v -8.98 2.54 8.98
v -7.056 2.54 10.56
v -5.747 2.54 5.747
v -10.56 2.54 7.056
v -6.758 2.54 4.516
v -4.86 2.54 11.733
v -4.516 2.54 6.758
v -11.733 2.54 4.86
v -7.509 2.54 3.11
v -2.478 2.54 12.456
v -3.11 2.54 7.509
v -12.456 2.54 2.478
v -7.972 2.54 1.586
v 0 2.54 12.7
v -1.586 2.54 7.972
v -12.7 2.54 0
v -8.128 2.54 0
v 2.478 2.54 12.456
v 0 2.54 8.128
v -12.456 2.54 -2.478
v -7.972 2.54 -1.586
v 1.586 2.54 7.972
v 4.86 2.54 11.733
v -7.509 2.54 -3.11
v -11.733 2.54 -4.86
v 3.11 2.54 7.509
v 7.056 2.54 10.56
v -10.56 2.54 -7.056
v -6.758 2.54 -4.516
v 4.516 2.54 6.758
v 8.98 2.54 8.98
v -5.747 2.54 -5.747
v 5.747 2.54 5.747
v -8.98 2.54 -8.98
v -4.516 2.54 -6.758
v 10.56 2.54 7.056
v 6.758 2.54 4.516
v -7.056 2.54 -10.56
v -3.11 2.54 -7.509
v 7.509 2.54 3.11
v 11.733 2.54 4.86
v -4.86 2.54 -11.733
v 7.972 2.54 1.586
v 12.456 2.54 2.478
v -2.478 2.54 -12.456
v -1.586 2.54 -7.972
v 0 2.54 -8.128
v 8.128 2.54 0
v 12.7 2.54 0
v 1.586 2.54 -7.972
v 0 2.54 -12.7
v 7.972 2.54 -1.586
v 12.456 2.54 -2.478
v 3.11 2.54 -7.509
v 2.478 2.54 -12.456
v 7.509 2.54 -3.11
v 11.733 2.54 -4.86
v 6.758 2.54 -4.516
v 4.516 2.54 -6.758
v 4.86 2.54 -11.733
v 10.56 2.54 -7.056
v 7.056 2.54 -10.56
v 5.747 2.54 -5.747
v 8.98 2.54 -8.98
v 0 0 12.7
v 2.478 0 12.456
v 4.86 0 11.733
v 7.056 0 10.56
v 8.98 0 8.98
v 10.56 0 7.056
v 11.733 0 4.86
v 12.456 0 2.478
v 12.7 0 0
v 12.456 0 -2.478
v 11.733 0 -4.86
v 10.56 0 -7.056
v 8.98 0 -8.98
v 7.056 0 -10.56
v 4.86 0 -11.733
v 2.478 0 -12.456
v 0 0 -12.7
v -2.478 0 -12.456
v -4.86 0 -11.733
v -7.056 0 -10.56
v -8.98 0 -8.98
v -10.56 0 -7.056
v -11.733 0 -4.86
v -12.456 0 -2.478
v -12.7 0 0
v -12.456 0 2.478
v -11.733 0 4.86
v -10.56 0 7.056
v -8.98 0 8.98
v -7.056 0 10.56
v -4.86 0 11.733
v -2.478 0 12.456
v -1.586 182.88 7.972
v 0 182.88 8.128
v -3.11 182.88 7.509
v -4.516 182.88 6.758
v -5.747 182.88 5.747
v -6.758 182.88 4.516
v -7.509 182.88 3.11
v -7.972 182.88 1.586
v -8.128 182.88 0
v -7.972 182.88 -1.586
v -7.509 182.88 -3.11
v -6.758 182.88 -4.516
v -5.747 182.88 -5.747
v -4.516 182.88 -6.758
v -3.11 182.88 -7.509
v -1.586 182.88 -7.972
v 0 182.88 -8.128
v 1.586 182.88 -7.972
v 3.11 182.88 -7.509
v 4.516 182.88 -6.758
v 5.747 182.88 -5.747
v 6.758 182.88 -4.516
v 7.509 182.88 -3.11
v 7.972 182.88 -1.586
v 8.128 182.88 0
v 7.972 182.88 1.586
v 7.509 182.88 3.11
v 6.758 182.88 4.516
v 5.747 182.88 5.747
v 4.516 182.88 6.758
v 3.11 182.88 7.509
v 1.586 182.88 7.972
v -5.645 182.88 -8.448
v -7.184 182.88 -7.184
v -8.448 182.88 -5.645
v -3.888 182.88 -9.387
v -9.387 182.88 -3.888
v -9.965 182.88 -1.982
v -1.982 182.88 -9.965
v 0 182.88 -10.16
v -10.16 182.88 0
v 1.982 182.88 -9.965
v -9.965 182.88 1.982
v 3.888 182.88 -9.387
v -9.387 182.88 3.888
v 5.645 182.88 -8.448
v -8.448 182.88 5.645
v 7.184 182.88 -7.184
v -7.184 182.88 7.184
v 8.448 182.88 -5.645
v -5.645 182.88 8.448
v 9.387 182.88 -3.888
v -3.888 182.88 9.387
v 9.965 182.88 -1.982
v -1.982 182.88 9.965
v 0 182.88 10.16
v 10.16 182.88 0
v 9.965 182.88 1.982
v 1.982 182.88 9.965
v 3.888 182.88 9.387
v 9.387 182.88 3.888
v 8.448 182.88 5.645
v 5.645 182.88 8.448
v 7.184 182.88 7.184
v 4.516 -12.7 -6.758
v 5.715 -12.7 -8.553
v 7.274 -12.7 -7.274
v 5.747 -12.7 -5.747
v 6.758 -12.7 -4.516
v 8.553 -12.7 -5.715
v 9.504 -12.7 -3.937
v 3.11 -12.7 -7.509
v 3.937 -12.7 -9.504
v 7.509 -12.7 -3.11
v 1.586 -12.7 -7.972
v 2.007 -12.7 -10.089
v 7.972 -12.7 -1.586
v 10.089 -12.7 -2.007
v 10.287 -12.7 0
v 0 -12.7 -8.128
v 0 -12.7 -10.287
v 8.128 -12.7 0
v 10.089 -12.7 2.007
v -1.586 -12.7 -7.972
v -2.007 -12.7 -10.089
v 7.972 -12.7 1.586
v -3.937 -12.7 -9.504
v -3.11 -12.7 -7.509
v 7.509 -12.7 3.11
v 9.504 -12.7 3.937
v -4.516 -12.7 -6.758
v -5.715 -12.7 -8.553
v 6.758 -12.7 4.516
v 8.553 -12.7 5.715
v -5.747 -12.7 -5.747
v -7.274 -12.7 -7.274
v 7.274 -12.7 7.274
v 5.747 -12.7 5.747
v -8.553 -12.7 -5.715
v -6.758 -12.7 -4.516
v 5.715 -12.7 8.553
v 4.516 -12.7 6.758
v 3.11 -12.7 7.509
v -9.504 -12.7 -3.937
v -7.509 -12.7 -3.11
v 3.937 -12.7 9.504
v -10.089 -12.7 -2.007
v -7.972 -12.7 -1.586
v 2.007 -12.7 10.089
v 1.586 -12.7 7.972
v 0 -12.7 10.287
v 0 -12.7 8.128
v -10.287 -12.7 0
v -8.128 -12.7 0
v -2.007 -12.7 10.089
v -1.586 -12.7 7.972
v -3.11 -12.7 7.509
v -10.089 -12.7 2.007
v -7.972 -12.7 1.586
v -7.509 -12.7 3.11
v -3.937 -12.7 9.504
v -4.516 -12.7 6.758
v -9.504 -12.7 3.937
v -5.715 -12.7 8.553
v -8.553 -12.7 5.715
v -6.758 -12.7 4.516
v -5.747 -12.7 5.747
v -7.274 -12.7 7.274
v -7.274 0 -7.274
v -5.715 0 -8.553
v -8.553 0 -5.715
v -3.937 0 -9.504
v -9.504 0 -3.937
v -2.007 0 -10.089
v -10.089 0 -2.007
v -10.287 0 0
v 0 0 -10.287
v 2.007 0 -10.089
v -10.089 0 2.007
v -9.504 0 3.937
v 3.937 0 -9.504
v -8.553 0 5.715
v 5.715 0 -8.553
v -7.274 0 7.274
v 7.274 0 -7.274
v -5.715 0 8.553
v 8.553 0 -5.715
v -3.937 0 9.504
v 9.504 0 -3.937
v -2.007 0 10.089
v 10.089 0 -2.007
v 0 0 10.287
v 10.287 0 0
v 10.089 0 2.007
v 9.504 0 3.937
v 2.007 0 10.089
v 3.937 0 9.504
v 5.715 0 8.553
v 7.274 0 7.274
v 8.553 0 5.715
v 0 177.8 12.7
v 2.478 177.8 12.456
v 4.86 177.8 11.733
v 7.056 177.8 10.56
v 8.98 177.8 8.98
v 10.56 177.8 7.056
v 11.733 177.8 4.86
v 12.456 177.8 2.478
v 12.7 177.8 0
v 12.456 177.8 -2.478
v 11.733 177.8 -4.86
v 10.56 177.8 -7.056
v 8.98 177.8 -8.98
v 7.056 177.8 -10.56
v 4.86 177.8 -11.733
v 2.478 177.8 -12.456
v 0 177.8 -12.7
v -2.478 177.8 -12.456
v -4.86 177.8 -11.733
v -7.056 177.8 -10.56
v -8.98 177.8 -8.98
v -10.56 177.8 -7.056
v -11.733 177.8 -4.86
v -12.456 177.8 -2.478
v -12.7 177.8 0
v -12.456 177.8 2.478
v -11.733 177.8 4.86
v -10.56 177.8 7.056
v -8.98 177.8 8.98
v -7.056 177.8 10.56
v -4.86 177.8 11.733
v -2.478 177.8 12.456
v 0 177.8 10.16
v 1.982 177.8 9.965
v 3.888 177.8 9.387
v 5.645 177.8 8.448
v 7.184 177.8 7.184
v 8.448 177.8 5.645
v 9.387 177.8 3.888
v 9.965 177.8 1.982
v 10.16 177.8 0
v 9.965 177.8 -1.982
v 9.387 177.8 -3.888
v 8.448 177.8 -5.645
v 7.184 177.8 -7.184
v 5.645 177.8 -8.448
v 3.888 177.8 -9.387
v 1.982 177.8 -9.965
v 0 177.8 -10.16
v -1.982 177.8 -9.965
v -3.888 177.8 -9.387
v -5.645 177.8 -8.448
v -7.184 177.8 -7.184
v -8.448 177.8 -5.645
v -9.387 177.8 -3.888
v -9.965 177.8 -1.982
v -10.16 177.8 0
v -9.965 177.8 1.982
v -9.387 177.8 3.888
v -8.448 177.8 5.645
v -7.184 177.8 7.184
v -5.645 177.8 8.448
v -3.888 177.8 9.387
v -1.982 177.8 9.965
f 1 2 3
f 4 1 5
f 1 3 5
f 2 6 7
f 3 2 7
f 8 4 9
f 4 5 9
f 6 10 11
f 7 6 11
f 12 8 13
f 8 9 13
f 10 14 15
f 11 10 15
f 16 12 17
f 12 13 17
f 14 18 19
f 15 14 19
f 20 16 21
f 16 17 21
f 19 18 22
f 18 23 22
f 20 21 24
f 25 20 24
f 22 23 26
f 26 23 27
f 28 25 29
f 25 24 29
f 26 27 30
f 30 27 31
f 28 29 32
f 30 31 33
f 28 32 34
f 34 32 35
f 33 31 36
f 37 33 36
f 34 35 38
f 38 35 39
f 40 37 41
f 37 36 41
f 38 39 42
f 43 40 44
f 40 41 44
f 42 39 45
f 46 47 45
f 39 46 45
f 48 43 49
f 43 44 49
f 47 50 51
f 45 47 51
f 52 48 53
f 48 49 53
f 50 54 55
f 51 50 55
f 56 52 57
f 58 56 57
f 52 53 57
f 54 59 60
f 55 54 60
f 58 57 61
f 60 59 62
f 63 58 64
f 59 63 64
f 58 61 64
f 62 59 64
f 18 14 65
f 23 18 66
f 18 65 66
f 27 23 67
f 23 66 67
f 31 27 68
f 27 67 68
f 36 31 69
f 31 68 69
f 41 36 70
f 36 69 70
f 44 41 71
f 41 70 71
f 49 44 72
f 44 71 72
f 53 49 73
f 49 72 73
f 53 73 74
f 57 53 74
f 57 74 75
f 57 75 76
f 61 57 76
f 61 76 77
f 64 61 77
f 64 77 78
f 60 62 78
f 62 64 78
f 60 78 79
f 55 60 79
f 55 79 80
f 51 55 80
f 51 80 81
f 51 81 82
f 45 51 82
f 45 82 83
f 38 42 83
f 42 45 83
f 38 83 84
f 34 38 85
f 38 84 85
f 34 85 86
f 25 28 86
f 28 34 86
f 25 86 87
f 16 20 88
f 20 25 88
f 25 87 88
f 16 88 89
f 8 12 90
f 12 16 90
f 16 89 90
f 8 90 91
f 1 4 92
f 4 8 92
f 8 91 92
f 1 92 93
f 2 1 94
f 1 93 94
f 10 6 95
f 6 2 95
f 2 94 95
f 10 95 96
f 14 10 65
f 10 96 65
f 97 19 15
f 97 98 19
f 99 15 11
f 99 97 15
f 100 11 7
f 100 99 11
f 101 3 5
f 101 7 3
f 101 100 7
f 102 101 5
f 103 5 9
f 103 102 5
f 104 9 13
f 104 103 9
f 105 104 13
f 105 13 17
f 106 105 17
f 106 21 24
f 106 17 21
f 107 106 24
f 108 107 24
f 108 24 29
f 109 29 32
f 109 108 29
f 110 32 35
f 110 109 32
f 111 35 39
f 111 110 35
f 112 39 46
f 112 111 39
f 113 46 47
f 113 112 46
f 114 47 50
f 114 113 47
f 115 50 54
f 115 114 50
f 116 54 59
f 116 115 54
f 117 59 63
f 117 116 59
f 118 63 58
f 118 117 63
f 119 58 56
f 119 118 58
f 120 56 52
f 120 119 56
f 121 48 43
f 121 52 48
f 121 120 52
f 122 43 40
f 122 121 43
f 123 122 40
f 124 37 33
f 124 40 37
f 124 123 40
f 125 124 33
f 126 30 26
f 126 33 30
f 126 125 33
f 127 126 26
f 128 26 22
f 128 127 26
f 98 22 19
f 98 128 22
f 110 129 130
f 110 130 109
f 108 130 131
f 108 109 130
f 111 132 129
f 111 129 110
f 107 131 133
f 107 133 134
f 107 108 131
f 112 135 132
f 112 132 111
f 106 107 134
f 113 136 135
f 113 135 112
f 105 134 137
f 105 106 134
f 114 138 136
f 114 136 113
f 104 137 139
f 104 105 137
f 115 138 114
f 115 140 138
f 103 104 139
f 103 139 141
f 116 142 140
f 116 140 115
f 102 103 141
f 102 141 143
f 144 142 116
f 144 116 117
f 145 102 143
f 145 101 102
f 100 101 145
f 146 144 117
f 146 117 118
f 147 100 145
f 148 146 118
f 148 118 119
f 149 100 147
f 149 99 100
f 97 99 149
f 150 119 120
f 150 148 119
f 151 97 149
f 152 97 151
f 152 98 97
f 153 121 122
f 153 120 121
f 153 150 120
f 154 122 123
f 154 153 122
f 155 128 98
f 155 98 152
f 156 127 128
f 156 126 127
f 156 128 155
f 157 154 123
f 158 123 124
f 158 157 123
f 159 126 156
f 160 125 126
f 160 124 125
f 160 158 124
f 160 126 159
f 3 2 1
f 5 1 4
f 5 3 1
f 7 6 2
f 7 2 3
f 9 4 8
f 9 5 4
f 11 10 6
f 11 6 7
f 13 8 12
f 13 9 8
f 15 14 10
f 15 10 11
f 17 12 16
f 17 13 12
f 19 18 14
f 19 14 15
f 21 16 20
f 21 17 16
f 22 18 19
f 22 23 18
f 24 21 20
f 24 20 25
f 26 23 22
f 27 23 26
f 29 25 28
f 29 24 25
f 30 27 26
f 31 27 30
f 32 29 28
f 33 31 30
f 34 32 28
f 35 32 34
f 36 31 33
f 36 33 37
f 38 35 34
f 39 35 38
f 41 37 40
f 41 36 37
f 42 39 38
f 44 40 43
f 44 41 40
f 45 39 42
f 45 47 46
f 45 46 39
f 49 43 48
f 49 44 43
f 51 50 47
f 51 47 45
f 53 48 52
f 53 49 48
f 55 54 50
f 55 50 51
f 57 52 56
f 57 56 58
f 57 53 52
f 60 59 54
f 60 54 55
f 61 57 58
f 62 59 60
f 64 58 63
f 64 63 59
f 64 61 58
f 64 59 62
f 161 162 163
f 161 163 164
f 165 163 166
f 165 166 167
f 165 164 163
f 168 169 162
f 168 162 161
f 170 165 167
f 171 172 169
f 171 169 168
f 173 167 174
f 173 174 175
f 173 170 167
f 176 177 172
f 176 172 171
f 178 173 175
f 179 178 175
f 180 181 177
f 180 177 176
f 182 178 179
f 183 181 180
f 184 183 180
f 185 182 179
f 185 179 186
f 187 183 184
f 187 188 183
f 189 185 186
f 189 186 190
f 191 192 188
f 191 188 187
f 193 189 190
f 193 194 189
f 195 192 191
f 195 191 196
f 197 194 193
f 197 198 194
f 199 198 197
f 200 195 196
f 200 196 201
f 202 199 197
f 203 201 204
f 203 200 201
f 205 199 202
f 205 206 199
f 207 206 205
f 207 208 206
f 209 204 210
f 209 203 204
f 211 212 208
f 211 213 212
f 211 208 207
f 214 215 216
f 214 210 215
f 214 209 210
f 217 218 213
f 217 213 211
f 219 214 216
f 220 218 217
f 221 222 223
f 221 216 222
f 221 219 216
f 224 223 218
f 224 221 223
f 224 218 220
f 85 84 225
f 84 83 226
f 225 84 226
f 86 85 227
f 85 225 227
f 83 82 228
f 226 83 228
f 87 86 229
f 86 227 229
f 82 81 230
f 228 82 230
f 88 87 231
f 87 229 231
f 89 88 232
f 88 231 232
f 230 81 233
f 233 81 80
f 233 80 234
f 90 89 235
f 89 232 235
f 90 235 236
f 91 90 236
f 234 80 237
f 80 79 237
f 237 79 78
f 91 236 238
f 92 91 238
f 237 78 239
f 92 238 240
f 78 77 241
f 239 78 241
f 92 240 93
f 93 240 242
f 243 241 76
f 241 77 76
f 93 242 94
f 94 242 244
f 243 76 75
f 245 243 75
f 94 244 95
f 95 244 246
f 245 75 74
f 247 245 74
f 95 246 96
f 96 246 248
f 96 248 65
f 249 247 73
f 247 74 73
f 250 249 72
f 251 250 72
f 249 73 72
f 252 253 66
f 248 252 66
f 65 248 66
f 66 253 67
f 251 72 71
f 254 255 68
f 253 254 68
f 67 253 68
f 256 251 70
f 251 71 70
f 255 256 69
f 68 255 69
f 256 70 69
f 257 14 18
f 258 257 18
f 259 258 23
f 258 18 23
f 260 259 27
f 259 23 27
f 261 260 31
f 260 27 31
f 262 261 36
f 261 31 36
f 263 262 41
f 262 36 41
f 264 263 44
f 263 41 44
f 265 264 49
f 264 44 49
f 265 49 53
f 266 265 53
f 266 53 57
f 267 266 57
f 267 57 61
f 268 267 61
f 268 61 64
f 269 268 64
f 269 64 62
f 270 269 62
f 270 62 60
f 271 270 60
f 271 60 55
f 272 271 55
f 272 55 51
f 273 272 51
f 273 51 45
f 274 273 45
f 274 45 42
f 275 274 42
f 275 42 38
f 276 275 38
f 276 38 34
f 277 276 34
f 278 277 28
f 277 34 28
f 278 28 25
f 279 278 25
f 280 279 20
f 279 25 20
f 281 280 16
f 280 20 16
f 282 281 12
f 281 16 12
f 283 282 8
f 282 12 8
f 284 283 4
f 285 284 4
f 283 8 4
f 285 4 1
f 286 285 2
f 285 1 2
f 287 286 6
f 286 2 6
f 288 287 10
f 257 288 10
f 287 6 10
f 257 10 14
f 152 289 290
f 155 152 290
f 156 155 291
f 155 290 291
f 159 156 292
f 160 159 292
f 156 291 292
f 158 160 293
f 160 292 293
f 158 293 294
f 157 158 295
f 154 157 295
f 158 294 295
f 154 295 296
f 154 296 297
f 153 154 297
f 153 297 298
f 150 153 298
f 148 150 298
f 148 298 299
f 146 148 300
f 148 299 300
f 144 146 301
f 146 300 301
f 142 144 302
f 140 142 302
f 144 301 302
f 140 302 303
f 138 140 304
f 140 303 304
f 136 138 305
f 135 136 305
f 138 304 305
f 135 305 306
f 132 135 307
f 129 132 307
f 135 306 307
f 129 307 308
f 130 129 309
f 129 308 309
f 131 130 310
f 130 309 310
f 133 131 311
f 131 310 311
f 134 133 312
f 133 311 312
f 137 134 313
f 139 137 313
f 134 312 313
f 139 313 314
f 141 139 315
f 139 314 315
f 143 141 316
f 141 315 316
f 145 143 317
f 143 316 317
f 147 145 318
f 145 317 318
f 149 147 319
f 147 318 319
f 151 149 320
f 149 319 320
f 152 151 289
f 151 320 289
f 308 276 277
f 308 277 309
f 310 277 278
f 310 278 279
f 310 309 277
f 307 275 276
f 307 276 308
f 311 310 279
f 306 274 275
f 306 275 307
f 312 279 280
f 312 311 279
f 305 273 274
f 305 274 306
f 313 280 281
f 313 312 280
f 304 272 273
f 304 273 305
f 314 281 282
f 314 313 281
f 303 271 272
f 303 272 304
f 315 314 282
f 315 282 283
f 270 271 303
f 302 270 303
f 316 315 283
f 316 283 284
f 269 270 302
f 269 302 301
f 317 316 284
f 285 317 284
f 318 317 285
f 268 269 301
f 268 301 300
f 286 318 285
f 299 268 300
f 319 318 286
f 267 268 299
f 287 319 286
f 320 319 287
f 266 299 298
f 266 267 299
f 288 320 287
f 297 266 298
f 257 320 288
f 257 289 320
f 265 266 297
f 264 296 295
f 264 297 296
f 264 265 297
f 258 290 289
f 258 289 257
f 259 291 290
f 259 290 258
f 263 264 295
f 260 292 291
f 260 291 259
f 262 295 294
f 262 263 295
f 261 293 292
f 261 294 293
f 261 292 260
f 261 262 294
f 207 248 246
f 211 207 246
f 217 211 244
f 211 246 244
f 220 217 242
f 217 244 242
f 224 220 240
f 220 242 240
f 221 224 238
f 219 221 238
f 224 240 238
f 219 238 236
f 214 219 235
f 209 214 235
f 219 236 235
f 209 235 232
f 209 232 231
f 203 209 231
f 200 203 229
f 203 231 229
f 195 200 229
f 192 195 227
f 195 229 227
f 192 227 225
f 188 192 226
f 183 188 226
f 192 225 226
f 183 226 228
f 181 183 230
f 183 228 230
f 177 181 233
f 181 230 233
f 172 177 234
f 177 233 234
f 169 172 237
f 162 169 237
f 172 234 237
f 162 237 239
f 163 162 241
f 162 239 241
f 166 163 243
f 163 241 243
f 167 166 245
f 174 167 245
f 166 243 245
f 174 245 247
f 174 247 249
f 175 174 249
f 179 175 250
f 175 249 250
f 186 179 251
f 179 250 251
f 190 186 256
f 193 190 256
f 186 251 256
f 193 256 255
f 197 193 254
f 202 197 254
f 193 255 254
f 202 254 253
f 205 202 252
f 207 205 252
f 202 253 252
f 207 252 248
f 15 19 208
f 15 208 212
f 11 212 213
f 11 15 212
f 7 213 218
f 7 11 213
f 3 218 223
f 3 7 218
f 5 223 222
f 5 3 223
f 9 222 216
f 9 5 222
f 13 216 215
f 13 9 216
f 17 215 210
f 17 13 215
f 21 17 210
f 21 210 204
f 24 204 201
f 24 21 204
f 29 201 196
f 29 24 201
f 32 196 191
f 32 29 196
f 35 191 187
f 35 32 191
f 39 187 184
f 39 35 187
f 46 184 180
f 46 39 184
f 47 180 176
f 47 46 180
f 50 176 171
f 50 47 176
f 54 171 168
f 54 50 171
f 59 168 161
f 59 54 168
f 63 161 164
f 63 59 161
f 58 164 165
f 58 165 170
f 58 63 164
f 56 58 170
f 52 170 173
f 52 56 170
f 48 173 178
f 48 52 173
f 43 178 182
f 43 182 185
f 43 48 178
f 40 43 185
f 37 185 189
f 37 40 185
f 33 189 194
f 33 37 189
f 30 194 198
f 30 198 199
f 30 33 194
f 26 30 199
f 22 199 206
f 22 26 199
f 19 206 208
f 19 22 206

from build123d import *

# Parameters (mm, degrees)
SKETCH1_R           = 12.7
BOSS_EXTRUDE1_DEPTH = 177.8
SKETCH4_R           = 10.16
BOSS_EXTRUDE2_DEPTH = 5.08
SKETCH5_R           = 8.128
CUT_EXTRUDE1_DEPTH  = 184.759828036
SKETCH6_R           = 10.287
SKETCH6_R_2         = 8.128
BOSS_EXTRUDE3_DEPTH = 12.7


with BuildPart() as part:
    # Sketch1 → Boss-Extrude1 (new body)
    with BuildSketch(Plane(origin=(0, 0, 0), x_dir=(1, 0, 0), z_dir=(0, 1, 0))):
        with Locations(Location((0, 0, 0), (0, 0, 270))):
            Circle(SKETCH1_R)
    extrude(amount=BOSS_EXTRUDE1_DEPTH)

    # Sketch4 → Boss-Extrude2 (add)
    with BuildSketch(Plane(origin=(0, 177.8, 0), x_dir=(1, 0, 0), z_dir=(0, 1, 0))):
        with Locations(Location((0, 0, 0), (0, 0, 270))):
            Circle(SKETCH4_R)
    extrude(amount=BOSS_EXTRUDE2_DEPTH)

    # Sketch5 → Cut-Extrude1 (cut, through all)
    with BuildSketch(Plane(origin=(0, 182.88, 0), x_dir=(1, 0, 0), z_dir=(0, 1, 0))):
        with Locations(Location((0, 0, 0), (0, 0, 270))):
            Circle(SKETCH5_R)
    extrude(amount=-CUT_EXTRUDE1_DEPTH, mode=Mode.SUBTRACT)

    # Sketch6 → Boss-Extrude3 (add)
    with BuildSketch(Plane.XZ):
        with Locations(Location((0, 0, 0), (0, 0, 90))):
            Circle(SKETCH6_R)
        with Locations(Location((0, 0, 0), (0, 0, 90))):
            Circle(SKETCH6_R_2, mode=Mode.SUBTRACT)
    extrude(amount=BOSS_EXTRUDE3_DEPTH)


with BuildPart() as body_2:
    # Split1: the piece on the far side of the plane
    add(part.part)
    split(bisect_by=Plane(origin=(0, 2.54, 0), x_dir=(0, 0, -1), z_dir=(0, -1, 0)), keep=Keep.BOTTOM)


with BuildPart() as part_1:
    add(part.part)

    # Split1
    split(bisect_by=Plane(origin=(0, 2.54, 0), x_dir=(0, 0, -1), z_dir=(0, -1, 0)), keep=Keep.TOP)


solid = Compound([body_2.part, part_1.part])
